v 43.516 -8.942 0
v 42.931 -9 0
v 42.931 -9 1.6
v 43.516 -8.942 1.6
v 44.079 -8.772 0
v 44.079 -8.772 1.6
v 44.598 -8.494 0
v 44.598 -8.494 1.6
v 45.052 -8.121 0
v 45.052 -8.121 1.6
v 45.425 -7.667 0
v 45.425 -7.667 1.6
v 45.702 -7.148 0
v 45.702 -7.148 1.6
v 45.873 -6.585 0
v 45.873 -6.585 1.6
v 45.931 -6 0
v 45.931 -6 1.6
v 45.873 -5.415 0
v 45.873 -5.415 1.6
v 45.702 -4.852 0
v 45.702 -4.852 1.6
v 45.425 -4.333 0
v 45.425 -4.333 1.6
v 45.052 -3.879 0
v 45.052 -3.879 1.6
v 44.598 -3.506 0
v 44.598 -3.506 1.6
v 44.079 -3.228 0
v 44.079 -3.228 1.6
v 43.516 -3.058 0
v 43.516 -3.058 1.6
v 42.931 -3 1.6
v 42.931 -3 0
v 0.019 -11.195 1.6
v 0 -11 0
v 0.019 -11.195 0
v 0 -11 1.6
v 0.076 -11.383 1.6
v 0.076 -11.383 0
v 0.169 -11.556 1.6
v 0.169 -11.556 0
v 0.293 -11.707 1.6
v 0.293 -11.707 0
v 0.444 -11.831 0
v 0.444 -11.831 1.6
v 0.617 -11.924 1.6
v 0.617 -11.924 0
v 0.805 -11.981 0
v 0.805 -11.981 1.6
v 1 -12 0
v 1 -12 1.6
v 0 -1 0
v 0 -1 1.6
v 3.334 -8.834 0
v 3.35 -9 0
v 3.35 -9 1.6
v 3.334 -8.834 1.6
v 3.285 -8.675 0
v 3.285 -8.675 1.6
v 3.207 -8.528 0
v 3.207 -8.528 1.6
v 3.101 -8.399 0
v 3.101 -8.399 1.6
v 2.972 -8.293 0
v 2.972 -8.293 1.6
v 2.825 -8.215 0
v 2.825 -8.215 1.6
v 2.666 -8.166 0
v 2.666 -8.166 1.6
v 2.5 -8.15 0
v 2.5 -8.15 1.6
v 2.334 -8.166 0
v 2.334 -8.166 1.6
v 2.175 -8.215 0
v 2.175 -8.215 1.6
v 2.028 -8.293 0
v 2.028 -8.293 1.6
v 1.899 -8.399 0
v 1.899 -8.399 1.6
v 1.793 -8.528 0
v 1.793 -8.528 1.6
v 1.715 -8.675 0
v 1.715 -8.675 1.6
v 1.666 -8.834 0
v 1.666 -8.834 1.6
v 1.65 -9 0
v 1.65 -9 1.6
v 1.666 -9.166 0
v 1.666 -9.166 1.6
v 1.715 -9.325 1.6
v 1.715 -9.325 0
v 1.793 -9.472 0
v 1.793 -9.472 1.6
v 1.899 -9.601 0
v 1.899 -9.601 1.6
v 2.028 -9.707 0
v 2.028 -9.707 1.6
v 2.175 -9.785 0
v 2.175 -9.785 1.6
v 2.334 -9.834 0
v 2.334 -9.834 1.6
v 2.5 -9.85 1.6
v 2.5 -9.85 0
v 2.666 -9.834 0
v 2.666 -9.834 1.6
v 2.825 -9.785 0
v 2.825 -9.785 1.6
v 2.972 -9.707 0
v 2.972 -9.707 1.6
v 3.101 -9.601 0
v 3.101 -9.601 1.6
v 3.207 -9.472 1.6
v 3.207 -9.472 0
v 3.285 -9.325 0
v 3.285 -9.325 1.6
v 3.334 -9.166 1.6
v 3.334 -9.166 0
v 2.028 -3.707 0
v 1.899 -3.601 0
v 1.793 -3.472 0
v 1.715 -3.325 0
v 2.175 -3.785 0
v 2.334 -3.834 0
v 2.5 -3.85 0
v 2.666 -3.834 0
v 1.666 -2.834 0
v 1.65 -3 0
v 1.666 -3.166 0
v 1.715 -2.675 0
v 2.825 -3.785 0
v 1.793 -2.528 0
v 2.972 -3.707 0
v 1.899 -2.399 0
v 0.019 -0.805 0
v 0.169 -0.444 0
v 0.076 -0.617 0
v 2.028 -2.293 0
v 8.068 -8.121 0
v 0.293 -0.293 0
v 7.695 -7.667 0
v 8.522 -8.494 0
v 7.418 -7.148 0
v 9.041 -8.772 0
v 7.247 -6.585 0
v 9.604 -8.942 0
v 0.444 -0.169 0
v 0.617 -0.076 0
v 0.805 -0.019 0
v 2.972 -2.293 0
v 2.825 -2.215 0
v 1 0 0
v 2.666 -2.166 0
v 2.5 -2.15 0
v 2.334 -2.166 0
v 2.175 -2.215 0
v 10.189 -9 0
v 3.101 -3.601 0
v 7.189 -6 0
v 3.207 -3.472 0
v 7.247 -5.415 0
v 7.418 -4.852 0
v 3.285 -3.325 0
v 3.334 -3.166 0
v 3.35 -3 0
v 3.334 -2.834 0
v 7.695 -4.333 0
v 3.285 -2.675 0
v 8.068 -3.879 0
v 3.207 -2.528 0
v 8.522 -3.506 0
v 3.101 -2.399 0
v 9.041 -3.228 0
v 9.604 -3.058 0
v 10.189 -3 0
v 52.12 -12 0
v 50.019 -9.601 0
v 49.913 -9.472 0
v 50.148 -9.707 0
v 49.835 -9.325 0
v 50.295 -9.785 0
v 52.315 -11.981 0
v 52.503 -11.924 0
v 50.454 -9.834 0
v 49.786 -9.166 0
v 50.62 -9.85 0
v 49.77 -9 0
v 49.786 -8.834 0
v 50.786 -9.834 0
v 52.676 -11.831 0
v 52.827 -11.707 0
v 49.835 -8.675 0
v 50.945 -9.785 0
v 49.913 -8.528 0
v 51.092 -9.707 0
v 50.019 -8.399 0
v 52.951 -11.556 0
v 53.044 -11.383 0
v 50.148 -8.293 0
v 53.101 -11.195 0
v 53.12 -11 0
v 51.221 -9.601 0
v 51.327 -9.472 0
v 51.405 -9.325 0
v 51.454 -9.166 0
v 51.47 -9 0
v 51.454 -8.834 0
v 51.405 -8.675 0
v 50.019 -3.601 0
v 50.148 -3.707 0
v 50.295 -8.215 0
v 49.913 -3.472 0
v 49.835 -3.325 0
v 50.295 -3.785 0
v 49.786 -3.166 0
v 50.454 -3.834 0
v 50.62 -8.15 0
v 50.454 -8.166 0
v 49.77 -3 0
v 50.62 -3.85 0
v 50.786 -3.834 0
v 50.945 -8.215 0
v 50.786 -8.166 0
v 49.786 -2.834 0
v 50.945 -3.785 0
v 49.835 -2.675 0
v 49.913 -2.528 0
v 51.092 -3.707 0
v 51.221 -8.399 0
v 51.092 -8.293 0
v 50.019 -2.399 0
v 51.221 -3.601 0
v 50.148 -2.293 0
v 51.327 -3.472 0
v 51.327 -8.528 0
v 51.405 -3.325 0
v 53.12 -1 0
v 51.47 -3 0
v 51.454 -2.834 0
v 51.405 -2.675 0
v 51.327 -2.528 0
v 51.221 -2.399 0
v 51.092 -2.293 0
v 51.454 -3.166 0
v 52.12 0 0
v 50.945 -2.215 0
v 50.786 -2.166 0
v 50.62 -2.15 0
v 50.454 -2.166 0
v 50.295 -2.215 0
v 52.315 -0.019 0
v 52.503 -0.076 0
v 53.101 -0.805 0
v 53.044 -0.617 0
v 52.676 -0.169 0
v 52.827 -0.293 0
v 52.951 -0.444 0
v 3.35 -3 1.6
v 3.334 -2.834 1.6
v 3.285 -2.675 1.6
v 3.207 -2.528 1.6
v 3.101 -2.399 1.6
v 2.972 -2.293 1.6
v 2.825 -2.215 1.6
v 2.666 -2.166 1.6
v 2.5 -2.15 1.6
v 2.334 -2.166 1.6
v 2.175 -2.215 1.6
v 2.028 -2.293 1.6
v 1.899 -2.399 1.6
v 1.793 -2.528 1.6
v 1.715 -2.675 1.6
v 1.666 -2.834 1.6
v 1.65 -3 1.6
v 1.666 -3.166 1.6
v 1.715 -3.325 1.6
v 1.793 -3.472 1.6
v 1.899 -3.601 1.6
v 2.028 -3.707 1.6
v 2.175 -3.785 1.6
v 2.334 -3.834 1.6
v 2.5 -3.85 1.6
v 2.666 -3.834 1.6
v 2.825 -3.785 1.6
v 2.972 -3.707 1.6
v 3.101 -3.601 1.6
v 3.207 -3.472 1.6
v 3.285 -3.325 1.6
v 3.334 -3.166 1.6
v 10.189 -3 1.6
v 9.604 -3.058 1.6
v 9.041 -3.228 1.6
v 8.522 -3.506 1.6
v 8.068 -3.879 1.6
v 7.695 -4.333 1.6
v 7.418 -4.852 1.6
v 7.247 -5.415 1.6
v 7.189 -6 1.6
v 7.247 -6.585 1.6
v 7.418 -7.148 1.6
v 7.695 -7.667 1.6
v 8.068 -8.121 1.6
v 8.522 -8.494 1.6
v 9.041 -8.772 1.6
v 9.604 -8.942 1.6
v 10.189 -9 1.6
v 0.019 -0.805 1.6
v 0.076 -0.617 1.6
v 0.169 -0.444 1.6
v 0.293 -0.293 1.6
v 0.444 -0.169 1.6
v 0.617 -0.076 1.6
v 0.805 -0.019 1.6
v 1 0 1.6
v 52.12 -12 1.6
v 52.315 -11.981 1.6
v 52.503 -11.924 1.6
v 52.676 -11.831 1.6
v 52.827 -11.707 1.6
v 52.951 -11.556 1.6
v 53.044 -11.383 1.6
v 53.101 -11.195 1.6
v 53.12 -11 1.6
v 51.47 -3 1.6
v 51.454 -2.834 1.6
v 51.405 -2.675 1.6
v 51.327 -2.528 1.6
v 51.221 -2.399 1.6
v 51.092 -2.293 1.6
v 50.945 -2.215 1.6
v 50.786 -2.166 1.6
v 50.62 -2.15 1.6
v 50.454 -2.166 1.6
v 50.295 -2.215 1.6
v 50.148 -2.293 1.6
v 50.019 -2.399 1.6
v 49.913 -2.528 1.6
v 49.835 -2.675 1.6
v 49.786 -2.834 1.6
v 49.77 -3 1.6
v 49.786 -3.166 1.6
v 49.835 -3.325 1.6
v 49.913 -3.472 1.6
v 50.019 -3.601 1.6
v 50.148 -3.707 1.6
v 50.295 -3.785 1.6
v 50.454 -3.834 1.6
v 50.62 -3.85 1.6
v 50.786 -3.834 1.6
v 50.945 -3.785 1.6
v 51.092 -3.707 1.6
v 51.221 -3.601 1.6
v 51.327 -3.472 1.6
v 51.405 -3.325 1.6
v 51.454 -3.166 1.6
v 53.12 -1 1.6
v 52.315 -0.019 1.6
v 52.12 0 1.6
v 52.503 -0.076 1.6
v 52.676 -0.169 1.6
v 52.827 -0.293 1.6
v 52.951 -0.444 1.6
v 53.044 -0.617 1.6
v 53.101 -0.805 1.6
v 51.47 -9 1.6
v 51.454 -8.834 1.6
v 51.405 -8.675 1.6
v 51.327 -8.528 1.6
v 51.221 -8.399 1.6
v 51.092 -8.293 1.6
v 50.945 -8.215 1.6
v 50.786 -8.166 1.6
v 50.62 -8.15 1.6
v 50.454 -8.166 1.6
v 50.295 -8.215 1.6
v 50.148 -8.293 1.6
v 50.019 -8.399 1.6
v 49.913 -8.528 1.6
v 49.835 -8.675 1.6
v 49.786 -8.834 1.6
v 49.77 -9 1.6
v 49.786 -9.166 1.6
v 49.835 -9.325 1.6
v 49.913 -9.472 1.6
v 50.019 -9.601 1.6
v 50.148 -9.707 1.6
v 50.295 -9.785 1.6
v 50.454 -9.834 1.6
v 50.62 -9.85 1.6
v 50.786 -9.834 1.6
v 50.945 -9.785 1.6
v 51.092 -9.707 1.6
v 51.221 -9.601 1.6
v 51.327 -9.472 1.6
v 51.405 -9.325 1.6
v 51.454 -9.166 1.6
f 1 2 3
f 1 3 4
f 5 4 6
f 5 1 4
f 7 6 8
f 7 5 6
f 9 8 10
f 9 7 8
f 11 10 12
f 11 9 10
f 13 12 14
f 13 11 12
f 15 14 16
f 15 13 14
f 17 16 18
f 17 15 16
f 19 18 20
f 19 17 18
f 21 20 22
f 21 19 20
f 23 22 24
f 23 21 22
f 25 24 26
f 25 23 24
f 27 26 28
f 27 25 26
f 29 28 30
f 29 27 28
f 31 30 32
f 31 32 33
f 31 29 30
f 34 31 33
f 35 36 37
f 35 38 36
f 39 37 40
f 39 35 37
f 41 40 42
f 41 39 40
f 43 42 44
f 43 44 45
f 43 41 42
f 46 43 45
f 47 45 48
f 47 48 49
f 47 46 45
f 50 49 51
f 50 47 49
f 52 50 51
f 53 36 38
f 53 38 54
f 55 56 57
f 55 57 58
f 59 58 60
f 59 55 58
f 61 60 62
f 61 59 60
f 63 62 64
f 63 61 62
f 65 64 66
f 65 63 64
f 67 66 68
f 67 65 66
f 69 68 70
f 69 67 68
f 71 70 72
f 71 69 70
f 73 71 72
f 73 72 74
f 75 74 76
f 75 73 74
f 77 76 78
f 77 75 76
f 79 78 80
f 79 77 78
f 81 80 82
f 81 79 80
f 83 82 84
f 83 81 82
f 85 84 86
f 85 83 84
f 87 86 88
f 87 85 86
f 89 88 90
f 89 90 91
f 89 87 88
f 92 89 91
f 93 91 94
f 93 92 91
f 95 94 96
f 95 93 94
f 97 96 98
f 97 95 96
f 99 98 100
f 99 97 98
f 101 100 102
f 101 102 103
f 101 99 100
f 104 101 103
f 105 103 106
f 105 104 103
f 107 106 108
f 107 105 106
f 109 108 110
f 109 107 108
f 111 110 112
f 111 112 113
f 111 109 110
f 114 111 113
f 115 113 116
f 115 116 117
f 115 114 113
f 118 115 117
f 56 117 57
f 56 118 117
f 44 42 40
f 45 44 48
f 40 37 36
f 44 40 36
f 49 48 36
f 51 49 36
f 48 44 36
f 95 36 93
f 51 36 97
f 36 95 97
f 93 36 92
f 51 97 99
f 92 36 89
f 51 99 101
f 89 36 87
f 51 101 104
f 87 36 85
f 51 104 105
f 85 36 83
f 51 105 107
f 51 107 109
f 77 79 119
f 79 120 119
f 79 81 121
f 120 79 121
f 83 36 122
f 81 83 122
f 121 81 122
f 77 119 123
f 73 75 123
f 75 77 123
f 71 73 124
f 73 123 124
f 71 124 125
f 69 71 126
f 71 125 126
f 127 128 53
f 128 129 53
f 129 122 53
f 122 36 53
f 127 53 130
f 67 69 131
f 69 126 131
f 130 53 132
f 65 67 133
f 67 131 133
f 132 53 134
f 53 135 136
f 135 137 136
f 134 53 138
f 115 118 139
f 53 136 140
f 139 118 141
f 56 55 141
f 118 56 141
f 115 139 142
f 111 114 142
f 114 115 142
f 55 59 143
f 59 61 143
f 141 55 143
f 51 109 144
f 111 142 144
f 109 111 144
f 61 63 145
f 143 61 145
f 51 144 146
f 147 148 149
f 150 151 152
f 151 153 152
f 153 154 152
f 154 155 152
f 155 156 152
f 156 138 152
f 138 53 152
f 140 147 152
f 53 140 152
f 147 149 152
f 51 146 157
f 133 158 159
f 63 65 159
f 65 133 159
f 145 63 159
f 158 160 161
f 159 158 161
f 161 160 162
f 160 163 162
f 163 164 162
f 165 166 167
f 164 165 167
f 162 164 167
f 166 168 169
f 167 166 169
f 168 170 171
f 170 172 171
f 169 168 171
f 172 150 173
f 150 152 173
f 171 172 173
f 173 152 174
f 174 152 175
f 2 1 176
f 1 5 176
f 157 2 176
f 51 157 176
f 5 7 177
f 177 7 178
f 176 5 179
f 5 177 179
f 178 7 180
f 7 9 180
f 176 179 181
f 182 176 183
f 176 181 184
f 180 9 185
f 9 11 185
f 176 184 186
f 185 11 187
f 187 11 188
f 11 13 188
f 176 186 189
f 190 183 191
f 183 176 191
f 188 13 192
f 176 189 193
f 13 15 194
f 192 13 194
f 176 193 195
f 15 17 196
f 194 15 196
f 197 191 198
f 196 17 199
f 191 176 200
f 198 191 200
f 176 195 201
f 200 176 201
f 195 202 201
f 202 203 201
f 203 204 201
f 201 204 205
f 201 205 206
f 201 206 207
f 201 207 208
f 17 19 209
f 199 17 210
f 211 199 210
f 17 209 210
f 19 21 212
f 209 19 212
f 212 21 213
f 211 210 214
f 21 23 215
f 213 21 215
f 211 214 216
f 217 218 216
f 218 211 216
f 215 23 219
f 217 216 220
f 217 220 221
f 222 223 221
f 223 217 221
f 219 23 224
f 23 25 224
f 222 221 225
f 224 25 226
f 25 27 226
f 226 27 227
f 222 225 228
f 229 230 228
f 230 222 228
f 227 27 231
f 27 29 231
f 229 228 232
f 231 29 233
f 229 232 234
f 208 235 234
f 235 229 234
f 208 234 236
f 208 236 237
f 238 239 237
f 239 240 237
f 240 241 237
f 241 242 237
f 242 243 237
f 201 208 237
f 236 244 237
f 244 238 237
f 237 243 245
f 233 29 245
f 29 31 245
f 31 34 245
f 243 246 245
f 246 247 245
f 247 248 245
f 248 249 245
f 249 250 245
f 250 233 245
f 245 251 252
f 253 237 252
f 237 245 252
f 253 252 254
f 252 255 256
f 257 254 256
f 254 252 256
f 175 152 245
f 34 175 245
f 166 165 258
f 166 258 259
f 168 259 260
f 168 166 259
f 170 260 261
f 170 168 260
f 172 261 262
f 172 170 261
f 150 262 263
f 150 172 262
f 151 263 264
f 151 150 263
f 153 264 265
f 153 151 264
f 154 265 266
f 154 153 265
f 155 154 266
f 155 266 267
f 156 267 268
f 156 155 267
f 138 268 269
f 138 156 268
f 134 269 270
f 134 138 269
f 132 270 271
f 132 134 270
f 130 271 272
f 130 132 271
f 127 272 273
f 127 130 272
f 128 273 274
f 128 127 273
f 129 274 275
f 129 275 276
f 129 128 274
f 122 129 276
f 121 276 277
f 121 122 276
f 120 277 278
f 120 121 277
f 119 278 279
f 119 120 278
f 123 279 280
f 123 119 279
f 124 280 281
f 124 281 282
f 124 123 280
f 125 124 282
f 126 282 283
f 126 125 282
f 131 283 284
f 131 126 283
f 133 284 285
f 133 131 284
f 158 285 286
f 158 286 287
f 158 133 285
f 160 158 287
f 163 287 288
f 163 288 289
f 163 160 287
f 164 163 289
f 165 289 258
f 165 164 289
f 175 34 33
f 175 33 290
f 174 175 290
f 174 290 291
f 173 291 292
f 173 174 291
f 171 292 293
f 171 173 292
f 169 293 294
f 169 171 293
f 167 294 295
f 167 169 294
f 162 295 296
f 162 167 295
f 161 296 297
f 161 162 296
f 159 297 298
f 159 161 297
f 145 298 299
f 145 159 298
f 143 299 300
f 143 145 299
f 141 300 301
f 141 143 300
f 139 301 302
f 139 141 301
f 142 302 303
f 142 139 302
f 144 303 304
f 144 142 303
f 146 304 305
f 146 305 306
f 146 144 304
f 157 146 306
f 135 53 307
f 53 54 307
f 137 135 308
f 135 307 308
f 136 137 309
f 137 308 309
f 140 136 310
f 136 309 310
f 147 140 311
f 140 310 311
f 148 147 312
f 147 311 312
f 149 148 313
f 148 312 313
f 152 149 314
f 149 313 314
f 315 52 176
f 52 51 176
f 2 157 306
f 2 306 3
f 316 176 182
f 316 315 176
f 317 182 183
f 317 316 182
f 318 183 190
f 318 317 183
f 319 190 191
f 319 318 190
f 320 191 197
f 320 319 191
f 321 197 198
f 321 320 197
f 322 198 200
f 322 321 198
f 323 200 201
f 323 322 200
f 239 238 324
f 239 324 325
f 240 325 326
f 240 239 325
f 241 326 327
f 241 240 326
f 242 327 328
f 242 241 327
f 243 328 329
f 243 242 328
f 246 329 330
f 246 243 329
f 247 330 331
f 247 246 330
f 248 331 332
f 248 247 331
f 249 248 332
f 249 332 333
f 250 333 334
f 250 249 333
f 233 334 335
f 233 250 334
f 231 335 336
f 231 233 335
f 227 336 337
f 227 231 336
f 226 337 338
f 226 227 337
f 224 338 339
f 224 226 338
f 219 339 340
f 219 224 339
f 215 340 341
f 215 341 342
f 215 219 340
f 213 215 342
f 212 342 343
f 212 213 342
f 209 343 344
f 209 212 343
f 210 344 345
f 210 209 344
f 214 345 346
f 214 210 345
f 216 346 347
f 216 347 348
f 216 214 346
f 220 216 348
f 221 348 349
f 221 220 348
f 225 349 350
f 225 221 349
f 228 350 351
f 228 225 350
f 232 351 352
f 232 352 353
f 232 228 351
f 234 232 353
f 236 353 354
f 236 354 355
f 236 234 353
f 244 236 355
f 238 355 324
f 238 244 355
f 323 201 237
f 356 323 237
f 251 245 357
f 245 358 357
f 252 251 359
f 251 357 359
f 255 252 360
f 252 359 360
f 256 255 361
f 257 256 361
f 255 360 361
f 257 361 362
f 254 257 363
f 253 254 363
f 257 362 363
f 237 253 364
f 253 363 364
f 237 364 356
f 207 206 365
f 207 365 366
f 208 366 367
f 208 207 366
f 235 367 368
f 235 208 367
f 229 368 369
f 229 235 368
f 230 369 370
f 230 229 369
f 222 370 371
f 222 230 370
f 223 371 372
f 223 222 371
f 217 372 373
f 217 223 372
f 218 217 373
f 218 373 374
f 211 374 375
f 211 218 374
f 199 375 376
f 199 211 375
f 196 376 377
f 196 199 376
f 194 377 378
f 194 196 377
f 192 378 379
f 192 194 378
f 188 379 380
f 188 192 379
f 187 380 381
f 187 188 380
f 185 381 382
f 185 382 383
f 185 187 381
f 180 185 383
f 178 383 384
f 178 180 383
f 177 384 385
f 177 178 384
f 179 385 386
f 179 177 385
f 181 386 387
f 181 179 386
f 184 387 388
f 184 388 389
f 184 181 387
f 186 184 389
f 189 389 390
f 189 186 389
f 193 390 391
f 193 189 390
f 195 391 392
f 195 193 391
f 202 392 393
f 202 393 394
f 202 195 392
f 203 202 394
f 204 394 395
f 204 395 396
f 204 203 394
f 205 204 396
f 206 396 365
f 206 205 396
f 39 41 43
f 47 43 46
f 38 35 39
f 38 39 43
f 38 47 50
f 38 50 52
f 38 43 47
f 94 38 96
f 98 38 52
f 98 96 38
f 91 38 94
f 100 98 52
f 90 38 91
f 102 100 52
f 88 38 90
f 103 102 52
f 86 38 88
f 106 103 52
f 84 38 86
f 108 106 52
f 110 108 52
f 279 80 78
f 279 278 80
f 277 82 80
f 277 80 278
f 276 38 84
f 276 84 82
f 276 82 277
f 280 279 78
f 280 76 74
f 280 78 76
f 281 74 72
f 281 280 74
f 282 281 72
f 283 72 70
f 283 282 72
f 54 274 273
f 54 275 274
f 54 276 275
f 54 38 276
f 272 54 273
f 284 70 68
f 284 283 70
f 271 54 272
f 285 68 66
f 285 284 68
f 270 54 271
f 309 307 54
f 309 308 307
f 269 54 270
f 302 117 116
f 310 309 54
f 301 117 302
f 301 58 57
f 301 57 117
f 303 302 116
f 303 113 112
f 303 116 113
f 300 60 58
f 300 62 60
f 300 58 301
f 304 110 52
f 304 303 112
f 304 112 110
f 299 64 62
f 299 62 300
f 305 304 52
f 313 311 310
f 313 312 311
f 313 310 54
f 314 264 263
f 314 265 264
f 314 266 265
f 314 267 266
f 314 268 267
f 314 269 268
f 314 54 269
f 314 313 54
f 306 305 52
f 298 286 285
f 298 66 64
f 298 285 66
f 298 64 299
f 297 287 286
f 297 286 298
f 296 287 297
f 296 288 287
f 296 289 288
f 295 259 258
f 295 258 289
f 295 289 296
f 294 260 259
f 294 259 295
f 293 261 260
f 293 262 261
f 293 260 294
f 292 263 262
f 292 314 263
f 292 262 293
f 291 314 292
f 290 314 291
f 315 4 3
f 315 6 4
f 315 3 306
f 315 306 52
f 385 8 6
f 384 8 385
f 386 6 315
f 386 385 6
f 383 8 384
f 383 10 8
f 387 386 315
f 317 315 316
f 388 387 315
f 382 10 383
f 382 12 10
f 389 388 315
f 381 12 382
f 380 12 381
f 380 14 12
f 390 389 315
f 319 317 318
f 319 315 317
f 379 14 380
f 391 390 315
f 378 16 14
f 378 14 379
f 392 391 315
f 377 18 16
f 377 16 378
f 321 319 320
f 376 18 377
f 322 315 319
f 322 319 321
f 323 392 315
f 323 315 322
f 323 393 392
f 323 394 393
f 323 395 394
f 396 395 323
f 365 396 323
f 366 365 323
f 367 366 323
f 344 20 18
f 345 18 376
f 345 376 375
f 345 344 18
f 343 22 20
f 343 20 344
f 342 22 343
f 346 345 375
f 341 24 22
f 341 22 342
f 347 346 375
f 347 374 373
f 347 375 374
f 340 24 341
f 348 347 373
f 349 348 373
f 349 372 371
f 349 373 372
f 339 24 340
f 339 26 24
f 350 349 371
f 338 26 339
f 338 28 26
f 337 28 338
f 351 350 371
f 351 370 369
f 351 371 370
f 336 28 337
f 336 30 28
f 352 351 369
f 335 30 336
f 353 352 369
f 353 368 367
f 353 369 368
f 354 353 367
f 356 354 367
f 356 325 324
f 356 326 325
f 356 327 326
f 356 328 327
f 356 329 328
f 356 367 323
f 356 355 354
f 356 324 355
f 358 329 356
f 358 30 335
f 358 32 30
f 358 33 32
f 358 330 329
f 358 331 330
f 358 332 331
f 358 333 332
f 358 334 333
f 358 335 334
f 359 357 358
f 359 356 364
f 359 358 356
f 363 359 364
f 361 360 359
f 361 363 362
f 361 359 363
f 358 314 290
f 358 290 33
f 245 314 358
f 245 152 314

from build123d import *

# Parameters (mm, degrees)
SKETCH_1_W          = 48.12
SKETCH_1_H          = 12
SKETCH_1_R          = 0.85
SKETCH_1_W_2        = 5
EXTRUDE_1_DEPTH     = 1.6
CUT_EXTRUDE_1_DEPTH = 1.6
FILLET_1_R          = 1


with BuildPart() as part:
    # 草图1 → 凸台-拉伸1 (new body)
    # profile 1 of 2: a face of its own
    with BuildSketch(Plane.XY):
        with Locations((29.06, -6)):
            Rectangle(SKETCH_1_W, SKETCH_1_H)
        with Locations((50.62, -9)):
            Circle(SKETCH_1_R, mode=Mode.SUBTRACT)
        with Locations((50.62, -3)):
            Circle(SKETCH_1_R, mode=Mode.SUBTRACT)
    # profile 2 of 2: a face of its own
    with BuildSketch(Plane.XY):
        with Locations((2.5, -6)):
            Rectangle(SKETCH_1_W_2, SKETCH_1_H)
        with Locations((2.5, -9)):
            Circle(SKETCH_1_R, mode=Mode.SUBTRACT)
        with Locations((2.5, -3)):
            Circle(SKETCH_1_R, mode=Mode.SUBTRACT)
    extrude(amount=EXTRUDE_1_DEPTH)

    # 草图2 → 切除-拉伸1 (cut)
    with BuildSketch(Plane(origin=(0, 0, 0), x_dir=(-1, 0, 0), z_dir=(0, 0, -1))):
        with BuildLine():
            Line((-42.930819808, -3), (-10.189180192, -3))
            ThreePointArc((-10.189180192, -3), (-7.189180192, -6), (-10.189180192, -9))
            Line((-10.189180192, -9), (-42.930819808, -9))
            ThreePointArc((-42.930819808, -9), (-45.930819808, -6), (-42.930819808, -3))
        make_face()
    extrude(amount=-CUT_EXTRUDE_1_DEPTH, mode=Mode.SUBTRACT)

    # 圆角1
    fillet_1_edges = [part.edges().sort_by_distance(p)[0] for p in [
        (53.12, -12, 0.8),
        (0, -12, 0.8),
        (0, 0, 0.8),
        (53.12, 0, 0.8),
    ]]
    fillet(fillet_1_edges, radius=FILLET_1_R)


solid = part.part
